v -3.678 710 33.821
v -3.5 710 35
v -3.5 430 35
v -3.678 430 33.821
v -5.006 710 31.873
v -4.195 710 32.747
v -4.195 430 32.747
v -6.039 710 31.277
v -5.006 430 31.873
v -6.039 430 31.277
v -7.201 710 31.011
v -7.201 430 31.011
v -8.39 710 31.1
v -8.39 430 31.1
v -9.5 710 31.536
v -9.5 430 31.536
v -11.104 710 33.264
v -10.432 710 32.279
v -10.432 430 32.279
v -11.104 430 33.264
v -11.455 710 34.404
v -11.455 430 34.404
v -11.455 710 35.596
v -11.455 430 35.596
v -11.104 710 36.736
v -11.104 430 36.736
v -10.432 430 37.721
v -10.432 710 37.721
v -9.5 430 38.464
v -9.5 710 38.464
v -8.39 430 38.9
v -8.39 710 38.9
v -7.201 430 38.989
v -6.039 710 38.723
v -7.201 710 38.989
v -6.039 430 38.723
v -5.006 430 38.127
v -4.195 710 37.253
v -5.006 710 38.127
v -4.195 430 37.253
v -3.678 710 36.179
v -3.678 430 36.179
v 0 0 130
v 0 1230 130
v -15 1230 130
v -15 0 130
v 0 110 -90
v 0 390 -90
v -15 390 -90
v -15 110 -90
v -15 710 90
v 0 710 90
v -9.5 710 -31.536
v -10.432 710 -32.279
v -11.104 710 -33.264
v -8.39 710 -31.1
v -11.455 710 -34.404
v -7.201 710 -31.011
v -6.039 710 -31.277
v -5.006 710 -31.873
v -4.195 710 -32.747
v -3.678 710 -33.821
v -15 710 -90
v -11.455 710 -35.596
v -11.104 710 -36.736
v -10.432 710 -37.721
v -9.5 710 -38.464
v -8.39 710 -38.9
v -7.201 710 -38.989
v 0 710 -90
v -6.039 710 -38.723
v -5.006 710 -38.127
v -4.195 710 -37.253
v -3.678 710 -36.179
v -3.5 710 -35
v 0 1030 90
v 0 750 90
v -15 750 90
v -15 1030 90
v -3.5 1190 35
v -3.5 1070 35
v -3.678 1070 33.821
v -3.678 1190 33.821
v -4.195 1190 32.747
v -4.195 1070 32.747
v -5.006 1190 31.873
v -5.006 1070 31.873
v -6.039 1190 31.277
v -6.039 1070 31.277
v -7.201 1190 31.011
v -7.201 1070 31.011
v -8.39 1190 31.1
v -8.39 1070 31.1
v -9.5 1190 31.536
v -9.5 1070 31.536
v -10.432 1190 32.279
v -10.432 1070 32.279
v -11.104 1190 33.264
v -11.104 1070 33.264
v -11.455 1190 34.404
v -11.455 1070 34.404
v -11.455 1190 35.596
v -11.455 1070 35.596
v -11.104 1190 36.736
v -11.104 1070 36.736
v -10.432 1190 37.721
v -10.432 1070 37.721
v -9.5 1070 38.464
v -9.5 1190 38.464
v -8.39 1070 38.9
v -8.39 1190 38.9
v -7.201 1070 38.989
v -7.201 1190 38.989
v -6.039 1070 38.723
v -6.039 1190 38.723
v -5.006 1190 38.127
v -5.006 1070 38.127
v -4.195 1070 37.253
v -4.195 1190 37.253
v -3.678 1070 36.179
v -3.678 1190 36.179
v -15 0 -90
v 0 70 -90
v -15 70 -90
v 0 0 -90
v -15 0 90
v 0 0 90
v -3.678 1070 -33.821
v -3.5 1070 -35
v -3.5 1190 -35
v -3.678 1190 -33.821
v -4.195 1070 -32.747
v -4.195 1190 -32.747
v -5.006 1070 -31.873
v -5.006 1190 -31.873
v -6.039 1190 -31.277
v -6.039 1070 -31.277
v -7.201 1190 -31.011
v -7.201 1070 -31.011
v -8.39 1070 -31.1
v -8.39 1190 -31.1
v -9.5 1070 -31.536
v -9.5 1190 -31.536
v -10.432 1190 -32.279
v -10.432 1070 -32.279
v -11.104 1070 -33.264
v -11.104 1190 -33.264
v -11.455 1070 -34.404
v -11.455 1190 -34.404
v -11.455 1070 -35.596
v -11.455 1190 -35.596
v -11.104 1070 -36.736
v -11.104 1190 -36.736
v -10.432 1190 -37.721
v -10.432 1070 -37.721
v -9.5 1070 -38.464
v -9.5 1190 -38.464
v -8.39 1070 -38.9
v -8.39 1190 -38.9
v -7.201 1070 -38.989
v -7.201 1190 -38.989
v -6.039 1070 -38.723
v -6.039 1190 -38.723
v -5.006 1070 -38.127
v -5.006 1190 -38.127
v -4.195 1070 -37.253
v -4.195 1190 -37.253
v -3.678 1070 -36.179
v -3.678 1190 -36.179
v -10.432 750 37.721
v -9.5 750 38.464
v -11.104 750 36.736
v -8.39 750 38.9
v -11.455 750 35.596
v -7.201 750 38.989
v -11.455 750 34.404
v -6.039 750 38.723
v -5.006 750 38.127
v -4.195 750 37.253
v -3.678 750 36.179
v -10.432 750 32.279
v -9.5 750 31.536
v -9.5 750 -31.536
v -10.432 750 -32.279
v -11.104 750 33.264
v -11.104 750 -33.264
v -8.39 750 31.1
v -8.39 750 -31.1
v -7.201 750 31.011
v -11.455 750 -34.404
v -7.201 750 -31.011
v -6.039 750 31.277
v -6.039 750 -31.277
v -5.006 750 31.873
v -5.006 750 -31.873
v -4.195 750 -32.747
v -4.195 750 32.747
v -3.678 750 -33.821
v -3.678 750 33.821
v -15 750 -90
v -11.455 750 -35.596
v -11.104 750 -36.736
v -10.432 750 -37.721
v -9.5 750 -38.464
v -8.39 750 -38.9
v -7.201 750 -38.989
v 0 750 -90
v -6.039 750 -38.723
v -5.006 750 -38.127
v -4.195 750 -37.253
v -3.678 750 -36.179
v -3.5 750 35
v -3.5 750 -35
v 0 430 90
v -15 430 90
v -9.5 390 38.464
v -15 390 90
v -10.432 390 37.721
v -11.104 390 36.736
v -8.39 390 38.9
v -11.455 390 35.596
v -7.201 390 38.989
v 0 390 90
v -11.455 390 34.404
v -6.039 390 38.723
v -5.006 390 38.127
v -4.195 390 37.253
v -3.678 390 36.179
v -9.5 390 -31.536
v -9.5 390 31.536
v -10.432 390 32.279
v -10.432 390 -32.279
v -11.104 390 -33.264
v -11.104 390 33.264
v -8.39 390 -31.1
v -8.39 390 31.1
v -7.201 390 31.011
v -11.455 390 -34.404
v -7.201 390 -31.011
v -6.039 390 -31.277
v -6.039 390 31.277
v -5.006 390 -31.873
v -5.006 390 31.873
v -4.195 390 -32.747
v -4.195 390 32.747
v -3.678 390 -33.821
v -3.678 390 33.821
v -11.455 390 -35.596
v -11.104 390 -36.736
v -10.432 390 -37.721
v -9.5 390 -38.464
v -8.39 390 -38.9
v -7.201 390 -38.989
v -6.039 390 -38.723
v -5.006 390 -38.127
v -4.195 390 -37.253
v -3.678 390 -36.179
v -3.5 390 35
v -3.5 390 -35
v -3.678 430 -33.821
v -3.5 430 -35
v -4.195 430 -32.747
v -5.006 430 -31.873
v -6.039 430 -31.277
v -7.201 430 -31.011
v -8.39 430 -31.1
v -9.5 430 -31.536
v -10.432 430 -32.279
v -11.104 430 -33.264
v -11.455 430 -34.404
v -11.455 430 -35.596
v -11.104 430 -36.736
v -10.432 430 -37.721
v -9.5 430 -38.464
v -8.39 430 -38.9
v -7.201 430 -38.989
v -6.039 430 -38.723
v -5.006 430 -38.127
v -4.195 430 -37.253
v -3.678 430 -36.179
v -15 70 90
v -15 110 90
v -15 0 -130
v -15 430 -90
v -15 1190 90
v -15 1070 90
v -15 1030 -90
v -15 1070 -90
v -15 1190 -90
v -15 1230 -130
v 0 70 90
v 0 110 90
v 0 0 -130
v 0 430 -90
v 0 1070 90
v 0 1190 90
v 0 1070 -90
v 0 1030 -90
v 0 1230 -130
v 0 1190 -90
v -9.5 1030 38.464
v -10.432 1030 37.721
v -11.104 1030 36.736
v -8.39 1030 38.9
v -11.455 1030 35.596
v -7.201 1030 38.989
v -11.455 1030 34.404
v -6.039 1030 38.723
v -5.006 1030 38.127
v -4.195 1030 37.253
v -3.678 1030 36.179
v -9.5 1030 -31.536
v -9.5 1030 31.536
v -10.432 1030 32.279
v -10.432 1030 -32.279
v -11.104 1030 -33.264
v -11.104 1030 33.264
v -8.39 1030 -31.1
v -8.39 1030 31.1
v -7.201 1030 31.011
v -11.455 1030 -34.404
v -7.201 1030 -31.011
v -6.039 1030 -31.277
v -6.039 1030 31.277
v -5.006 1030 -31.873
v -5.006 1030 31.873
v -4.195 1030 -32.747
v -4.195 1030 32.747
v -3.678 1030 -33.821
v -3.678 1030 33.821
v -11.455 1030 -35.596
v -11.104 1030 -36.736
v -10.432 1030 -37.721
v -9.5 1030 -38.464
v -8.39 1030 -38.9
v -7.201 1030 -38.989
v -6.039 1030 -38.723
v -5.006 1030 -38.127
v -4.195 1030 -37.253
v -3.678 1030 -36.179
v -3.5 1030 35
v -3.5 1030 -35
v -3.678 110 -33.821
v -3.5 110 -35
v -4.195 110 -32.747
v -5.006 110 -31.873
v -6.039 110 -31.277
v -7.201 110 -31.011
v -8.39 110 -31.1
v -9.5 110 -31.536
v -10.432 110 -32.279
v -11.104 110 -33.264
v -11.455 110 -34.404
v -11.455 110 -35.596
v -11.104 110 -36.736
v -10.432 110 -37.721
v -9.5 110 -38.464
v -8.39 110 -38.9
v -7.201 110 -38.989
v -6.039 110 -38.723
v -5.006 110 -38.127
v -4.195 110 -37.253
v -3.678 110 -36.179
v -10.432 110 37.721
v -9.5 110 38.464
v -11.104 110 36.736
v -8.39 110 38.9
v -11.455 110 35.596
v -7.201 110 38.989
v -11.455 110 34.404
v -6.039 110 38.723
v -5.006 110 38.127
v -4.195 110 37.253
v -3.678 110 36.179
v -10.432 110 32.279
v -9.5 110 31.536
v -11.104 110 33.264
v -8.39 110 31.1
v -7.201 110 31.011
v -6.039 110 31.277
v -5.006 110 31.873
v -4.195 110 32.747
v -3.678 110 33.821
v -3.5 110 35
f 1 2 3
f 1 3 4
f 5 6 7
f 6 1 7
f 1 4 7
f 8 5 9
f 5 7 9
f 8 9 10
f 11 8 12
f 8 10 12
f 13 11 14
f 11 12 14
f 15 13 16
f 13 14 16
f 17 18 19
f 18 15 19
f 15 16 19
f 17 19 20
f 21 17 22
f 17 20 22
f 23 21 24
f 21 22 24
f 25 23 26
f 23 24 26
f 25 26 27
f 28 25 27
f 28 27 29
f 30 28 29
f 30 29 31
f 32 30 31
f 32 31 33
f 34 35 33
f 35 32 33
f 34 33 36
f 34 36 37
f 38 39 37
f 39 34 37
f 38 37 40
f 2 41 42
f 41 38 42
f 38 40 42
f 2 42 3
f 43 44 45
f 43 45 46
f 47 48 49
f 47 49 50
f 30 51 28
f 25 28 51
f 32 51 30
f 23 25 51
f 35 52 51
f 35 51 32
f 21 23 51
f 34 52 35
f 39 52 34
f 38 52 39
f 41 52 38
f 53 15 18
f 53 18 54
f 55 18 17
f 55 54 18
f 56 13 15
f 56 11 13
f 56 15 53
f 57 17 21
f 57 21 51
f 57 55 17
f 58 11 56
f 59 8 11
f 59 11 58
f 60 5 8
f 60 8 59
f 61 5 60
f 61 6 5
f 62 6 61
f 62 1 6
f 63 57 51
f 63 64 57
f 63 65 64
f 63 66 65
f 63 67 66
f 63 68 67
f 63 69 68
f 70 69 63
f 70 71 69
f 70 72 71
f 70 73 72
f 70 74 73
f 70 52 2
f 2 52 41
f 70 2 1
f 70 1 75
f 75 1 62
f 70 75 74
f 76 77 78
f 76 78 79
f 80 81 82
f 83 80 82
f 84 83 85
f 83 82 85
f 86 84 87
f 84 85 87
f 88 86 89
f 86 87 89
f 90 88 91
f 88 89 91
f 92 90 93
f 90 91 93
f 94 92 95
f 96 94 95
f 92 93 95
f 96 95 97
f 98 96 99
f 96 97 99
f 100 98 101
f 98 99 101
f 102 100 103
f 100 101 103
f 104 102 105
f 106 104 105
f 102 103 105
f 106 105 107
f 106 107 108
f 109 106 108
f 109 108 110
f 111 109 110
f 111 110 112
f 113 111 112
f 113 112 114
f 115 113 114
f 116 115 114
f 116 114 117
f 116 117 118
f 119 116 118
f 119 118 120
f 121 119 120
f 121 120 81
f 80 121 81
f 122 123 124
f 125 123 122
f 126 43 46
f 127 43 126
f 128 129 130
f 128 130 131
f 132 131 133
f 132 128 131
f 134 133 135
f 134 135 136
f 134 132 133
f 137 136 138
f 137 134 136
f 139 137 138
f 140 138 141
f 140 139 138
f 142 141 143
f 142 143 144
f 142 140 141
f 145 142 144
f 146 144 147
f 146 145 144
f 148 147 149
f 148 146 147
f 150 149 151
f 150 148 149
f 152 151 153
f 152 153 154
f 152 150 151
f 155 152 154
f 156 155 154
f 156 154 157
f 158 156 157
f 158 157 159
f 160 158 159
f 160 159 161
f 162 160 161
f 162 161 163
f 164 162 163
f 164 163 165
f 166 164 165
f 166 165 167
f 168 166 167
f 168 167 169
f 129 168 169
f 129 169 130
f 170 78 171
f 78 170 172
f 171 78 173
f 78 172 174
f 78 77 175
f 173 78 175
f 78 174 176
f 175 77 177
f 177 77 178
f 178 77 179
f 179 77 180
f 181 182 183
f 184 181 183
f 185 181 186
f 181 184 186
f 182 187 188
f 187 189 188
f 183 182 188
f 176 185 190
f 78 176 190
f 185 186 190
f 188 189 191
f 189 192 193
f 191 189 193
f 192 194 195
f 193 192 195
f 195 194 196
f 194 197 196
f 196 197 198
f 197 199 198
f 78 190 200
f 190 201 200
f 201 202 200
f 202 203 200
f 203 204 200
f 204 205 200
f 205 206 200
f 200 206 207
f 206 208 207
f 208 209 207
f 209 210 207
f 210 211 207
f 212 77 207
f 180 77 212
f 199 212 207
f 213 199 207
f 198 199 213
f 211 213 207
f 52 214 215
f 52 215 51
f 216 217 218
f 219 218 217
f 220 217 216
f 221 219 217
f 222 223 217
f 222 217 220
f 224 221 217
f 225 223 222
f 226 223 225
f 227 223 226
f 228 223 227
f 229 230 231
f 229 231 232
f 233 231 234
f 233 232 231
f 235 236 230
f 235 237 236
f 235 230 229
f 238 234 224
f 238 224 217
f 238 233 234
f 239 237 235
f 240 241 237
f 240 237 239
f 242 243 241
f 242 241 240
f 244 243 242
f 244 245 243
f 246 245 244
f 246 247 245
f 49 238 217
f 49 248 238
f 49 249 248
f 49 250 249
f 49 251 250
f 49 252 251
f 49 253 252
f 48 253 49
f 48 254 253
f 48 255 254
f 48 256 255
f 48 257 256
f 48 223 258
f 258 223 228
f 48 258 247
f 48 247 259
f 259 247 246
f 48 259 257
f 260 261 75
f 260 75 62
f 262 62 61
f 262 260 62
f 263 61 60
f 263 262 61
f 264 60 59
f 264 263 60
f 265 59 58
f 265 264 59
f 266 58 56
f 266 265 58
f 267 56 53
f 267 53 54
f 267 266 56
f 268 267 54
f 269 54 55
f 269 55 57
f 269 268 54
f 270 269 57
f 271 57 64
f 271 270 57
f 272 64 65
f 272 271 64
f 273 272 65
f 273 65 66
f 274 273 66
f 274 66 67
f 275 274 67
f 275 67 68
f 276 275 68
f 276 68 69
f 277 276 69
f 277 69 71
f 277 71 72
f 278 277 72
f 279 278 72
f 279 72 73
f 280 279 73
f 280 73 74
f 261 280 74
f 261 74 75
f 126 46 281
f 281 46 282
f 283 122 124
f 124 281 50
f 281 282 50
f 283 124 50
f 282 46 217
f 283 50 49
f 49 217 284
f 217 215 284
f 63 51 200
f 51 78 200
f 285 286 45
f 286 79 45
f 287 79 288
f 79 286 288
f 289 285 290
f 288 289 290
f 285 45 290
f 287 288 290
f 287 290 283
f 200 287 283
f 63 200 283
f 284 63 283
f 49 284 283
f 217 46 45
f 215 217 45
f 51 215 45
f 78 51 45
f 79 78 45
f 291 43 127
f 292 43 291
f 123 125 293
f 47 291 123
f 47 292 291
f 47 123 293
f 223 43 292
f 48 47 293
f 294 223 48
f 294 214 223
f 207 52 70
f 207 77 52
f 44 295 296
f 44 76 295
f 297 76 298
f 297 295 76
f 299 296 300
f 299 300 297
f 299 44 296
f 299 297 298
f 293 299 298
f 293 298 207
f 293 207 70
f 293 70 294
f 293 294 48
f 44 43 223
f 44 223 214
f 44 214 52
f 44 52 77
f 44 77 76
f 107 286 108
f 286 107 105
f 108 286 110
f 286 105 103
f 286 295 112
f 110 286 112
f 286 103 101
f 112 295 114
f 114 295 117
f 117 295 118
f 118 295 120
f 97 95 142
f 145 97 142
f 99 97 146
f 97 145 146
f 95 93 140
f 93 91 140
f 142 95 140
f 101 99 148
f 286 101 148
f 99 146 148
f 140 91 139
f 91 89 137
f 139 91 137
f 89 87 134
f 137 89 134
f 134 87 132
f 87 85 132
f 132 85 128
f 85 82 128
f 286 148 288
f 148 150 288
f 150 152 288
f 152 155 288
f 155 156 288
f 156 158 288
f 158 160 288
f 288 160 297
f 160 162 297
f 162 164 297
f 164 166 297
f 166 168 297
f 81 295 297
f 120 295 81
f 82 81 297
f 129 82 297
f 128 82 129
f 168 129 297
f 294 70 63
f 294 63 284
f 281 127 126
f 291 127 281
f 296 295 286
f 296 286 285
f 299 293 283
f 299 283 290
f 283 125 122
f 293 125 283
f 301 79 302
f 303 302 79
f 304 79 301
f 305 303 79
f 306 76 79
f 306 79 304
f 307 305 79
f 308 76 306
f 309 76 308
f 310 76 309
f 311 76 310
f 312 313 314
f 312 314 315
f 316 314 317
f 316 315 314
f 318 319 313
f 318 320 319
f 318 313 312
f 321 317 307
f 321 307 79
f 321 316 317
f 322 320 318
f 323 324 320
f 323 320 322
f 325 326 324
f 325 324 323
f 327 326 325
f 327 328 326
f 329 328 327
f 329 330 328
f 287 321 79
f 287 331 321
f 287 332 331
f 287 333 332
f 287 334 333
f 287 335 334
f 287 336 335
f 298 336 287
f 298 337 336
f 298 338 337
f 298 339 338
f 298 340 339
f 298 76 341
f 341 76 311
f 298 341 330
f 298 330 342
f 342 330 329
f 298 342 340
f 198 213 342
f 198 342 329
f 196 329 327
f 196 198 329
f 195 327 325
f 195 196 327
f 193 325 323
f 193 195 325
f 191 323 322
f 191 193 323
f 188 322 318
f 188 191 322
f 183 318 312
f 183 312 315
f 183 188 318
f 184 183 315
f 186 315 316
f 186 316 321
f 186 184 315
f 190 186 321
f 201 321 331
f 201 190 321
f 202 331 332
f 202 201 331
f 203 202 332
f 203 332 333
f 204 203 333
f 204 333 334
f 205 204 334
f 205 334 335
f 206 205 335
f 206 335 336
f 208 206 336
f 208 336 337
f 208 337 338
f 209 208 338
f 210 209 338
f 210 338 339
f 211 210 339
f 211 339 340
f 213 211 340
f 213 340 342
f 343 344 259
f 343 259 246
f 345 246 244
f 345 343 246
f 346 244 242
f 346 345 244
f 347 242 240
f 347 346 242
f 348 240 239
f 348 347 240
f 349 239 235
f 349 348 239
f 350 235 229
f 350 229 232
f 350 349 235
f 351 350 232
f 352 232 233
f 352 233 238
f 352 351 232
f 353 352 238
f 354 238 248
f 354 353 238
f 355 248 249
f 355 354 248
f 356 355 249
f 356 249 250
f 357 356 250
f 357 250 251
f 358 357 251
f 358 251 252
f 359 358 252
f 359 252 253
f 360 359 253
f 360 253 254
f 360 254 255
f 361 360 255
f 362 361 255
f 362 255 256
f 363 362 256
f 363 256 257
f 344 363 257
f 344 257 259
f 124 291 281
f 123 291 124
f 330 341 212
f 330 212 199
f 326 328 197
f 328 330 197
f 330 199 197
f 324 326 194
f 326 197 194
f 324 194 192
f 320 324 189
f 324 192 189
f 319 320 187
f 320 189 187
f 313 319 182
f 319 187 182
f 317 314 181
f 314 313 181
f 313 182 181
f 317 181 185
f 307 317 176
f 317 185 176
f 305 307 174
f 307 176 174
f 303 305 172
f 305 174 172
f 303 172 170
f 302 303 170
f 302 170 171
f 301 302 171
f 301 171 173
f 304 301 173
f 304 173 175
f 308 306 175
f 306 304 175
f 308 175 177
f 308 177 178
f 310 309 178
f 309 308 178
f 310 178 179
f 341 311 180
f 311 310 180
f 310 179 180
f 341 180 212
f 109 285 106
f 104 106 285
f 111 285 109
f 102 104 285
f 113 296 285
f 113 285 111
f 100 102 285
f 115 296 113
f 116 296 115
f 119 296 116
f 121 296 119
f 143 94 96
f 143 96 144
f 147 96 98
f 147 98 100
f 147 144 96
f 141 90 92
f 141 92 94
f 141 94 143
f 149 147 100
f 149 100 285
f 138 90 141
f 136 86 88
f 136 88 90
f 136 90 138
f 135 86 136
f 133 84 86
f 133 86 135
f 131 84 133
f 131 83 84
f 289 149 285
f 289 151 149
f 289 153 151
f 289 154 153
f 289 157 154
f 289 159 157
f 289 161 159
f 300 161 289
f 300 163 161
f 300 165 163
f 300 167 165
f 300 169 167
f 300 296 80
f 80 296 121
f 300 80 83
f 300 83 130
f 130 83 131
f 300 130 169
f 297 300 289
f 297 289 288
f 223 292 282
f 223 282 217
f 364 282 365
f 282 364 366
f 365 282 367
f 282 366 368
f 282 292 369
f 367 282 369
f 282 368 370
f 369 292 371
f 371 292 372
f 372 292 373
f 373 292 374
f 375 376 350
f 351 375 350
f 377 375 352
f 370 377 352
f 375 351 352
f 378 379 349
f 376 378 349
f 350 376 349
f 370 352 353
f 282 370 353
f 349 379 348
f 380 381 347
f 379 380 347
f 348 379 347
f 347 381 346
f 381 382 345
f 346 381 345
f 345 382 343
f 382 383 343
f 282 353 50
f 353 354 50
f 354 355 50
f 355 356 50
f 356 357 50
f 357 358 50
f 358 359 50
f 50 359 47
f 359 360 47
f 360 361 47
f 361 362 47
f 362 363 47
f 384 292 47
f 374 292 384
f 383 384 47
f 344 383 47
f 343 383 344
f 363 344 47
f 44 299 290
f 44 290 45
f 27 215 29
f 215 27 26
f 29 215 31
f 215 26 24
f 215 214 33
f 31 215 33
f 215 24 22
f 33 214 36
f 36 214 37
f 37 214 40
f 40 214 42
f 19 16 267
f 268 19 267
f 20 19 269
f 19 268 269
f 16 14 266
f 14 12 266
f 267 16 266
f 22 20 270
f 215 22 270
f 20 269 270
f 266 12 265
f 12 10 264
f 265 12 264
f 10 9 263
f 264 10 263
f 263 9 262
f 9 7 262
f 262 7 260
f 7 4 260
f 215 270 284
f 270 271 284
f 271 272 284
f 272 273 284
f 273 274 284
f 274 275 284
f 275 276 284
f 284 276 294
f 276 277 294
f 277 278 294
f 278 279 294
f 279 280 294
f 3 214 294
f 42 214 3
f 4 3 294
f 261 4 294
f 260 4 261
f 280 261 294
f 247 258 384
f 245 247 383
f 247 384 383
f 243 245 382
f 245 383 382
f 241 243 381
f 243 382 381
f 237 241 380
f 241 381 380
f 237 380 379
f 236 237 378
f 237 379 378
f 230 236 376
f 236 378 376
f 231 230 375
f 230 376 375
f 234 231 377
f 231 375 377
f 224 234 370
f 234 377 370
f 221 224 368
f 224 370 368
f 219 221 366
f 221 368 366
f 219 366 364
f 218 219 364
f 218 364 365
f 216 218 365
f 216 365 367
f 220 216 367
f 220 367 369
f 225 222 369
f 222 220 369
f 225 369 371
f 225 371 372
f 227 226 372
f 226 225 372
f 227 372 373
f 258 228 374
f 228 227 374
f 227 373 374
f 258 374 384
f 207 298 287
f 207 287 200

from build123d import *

# Parameters (mm, degrees)
EXTRUDE_1_DEPTH        = 15
SKETCH_2_W             = 180
SKETCH_2_H             = 40
EXTRUDE_2_DEPTH        = 15
PATTERN_LINEAR_1_COUNT = 4
PATTERN_LINEAR_1_PITCH = 320
SKETCH_3_R             = 4
EXTRUDE_3_DEPTH        = 1080


with BuildPart() as part:
    # 草图1 → 凸台-拉伸1 (new body)
    with BuildSketch(Plane(origin=(0, 0, 0), x_dir=(0, 0, -1), z_dir=(1, 0, 0))):
        Polygon((-90, 0), (-90, 1190), (90, 1190), (90, 0), (130, 0), (130, 1230), (-130, 1230), (-130, 0), align=None)
    extrude(amount=-EXTRUDE_1_DEPTH)

    # 草图2 → 凸台-拉伸2 (add)
    with BuildSketch(Plane(origin=(0, 0, 0), x_dir=(0, 0, -1), z_dir=(1, 0, 0))):
        with Locations((0, 90)):
            Rectangle(SKETCH_2_W, SKETCH_2_H)
    extrude_2 = extrude(amount=-EXTRUDE_2_DEPTH)

    # 阵列(线性)1: 凸台-拉伸2 ×4
    with Locations(*[(0, i * PATTERN_LINEAR_1_PITCH, 0) for i in range(1, PATTERN_LINEAR_1_COUNT)]):
        add(extrude_2)

    # 草图3 → 凸台-拉伸3 (add)
    with BuildSketch(Plane(origin=(0, 110, 0), x_dir=(1, 0, 0), z_dir=(0, 1, 0))):
        with Locations((-7.5, -35)):
            Circle(SKETCH_3_R)
    extrude_3 = extrude(amount=EXTRUDE_3_DEPTH)

    # 镜向1: 凸台-拉伸3 across plane
    add(extrude_3.mirror(Plane.XY))


solid = part.part
